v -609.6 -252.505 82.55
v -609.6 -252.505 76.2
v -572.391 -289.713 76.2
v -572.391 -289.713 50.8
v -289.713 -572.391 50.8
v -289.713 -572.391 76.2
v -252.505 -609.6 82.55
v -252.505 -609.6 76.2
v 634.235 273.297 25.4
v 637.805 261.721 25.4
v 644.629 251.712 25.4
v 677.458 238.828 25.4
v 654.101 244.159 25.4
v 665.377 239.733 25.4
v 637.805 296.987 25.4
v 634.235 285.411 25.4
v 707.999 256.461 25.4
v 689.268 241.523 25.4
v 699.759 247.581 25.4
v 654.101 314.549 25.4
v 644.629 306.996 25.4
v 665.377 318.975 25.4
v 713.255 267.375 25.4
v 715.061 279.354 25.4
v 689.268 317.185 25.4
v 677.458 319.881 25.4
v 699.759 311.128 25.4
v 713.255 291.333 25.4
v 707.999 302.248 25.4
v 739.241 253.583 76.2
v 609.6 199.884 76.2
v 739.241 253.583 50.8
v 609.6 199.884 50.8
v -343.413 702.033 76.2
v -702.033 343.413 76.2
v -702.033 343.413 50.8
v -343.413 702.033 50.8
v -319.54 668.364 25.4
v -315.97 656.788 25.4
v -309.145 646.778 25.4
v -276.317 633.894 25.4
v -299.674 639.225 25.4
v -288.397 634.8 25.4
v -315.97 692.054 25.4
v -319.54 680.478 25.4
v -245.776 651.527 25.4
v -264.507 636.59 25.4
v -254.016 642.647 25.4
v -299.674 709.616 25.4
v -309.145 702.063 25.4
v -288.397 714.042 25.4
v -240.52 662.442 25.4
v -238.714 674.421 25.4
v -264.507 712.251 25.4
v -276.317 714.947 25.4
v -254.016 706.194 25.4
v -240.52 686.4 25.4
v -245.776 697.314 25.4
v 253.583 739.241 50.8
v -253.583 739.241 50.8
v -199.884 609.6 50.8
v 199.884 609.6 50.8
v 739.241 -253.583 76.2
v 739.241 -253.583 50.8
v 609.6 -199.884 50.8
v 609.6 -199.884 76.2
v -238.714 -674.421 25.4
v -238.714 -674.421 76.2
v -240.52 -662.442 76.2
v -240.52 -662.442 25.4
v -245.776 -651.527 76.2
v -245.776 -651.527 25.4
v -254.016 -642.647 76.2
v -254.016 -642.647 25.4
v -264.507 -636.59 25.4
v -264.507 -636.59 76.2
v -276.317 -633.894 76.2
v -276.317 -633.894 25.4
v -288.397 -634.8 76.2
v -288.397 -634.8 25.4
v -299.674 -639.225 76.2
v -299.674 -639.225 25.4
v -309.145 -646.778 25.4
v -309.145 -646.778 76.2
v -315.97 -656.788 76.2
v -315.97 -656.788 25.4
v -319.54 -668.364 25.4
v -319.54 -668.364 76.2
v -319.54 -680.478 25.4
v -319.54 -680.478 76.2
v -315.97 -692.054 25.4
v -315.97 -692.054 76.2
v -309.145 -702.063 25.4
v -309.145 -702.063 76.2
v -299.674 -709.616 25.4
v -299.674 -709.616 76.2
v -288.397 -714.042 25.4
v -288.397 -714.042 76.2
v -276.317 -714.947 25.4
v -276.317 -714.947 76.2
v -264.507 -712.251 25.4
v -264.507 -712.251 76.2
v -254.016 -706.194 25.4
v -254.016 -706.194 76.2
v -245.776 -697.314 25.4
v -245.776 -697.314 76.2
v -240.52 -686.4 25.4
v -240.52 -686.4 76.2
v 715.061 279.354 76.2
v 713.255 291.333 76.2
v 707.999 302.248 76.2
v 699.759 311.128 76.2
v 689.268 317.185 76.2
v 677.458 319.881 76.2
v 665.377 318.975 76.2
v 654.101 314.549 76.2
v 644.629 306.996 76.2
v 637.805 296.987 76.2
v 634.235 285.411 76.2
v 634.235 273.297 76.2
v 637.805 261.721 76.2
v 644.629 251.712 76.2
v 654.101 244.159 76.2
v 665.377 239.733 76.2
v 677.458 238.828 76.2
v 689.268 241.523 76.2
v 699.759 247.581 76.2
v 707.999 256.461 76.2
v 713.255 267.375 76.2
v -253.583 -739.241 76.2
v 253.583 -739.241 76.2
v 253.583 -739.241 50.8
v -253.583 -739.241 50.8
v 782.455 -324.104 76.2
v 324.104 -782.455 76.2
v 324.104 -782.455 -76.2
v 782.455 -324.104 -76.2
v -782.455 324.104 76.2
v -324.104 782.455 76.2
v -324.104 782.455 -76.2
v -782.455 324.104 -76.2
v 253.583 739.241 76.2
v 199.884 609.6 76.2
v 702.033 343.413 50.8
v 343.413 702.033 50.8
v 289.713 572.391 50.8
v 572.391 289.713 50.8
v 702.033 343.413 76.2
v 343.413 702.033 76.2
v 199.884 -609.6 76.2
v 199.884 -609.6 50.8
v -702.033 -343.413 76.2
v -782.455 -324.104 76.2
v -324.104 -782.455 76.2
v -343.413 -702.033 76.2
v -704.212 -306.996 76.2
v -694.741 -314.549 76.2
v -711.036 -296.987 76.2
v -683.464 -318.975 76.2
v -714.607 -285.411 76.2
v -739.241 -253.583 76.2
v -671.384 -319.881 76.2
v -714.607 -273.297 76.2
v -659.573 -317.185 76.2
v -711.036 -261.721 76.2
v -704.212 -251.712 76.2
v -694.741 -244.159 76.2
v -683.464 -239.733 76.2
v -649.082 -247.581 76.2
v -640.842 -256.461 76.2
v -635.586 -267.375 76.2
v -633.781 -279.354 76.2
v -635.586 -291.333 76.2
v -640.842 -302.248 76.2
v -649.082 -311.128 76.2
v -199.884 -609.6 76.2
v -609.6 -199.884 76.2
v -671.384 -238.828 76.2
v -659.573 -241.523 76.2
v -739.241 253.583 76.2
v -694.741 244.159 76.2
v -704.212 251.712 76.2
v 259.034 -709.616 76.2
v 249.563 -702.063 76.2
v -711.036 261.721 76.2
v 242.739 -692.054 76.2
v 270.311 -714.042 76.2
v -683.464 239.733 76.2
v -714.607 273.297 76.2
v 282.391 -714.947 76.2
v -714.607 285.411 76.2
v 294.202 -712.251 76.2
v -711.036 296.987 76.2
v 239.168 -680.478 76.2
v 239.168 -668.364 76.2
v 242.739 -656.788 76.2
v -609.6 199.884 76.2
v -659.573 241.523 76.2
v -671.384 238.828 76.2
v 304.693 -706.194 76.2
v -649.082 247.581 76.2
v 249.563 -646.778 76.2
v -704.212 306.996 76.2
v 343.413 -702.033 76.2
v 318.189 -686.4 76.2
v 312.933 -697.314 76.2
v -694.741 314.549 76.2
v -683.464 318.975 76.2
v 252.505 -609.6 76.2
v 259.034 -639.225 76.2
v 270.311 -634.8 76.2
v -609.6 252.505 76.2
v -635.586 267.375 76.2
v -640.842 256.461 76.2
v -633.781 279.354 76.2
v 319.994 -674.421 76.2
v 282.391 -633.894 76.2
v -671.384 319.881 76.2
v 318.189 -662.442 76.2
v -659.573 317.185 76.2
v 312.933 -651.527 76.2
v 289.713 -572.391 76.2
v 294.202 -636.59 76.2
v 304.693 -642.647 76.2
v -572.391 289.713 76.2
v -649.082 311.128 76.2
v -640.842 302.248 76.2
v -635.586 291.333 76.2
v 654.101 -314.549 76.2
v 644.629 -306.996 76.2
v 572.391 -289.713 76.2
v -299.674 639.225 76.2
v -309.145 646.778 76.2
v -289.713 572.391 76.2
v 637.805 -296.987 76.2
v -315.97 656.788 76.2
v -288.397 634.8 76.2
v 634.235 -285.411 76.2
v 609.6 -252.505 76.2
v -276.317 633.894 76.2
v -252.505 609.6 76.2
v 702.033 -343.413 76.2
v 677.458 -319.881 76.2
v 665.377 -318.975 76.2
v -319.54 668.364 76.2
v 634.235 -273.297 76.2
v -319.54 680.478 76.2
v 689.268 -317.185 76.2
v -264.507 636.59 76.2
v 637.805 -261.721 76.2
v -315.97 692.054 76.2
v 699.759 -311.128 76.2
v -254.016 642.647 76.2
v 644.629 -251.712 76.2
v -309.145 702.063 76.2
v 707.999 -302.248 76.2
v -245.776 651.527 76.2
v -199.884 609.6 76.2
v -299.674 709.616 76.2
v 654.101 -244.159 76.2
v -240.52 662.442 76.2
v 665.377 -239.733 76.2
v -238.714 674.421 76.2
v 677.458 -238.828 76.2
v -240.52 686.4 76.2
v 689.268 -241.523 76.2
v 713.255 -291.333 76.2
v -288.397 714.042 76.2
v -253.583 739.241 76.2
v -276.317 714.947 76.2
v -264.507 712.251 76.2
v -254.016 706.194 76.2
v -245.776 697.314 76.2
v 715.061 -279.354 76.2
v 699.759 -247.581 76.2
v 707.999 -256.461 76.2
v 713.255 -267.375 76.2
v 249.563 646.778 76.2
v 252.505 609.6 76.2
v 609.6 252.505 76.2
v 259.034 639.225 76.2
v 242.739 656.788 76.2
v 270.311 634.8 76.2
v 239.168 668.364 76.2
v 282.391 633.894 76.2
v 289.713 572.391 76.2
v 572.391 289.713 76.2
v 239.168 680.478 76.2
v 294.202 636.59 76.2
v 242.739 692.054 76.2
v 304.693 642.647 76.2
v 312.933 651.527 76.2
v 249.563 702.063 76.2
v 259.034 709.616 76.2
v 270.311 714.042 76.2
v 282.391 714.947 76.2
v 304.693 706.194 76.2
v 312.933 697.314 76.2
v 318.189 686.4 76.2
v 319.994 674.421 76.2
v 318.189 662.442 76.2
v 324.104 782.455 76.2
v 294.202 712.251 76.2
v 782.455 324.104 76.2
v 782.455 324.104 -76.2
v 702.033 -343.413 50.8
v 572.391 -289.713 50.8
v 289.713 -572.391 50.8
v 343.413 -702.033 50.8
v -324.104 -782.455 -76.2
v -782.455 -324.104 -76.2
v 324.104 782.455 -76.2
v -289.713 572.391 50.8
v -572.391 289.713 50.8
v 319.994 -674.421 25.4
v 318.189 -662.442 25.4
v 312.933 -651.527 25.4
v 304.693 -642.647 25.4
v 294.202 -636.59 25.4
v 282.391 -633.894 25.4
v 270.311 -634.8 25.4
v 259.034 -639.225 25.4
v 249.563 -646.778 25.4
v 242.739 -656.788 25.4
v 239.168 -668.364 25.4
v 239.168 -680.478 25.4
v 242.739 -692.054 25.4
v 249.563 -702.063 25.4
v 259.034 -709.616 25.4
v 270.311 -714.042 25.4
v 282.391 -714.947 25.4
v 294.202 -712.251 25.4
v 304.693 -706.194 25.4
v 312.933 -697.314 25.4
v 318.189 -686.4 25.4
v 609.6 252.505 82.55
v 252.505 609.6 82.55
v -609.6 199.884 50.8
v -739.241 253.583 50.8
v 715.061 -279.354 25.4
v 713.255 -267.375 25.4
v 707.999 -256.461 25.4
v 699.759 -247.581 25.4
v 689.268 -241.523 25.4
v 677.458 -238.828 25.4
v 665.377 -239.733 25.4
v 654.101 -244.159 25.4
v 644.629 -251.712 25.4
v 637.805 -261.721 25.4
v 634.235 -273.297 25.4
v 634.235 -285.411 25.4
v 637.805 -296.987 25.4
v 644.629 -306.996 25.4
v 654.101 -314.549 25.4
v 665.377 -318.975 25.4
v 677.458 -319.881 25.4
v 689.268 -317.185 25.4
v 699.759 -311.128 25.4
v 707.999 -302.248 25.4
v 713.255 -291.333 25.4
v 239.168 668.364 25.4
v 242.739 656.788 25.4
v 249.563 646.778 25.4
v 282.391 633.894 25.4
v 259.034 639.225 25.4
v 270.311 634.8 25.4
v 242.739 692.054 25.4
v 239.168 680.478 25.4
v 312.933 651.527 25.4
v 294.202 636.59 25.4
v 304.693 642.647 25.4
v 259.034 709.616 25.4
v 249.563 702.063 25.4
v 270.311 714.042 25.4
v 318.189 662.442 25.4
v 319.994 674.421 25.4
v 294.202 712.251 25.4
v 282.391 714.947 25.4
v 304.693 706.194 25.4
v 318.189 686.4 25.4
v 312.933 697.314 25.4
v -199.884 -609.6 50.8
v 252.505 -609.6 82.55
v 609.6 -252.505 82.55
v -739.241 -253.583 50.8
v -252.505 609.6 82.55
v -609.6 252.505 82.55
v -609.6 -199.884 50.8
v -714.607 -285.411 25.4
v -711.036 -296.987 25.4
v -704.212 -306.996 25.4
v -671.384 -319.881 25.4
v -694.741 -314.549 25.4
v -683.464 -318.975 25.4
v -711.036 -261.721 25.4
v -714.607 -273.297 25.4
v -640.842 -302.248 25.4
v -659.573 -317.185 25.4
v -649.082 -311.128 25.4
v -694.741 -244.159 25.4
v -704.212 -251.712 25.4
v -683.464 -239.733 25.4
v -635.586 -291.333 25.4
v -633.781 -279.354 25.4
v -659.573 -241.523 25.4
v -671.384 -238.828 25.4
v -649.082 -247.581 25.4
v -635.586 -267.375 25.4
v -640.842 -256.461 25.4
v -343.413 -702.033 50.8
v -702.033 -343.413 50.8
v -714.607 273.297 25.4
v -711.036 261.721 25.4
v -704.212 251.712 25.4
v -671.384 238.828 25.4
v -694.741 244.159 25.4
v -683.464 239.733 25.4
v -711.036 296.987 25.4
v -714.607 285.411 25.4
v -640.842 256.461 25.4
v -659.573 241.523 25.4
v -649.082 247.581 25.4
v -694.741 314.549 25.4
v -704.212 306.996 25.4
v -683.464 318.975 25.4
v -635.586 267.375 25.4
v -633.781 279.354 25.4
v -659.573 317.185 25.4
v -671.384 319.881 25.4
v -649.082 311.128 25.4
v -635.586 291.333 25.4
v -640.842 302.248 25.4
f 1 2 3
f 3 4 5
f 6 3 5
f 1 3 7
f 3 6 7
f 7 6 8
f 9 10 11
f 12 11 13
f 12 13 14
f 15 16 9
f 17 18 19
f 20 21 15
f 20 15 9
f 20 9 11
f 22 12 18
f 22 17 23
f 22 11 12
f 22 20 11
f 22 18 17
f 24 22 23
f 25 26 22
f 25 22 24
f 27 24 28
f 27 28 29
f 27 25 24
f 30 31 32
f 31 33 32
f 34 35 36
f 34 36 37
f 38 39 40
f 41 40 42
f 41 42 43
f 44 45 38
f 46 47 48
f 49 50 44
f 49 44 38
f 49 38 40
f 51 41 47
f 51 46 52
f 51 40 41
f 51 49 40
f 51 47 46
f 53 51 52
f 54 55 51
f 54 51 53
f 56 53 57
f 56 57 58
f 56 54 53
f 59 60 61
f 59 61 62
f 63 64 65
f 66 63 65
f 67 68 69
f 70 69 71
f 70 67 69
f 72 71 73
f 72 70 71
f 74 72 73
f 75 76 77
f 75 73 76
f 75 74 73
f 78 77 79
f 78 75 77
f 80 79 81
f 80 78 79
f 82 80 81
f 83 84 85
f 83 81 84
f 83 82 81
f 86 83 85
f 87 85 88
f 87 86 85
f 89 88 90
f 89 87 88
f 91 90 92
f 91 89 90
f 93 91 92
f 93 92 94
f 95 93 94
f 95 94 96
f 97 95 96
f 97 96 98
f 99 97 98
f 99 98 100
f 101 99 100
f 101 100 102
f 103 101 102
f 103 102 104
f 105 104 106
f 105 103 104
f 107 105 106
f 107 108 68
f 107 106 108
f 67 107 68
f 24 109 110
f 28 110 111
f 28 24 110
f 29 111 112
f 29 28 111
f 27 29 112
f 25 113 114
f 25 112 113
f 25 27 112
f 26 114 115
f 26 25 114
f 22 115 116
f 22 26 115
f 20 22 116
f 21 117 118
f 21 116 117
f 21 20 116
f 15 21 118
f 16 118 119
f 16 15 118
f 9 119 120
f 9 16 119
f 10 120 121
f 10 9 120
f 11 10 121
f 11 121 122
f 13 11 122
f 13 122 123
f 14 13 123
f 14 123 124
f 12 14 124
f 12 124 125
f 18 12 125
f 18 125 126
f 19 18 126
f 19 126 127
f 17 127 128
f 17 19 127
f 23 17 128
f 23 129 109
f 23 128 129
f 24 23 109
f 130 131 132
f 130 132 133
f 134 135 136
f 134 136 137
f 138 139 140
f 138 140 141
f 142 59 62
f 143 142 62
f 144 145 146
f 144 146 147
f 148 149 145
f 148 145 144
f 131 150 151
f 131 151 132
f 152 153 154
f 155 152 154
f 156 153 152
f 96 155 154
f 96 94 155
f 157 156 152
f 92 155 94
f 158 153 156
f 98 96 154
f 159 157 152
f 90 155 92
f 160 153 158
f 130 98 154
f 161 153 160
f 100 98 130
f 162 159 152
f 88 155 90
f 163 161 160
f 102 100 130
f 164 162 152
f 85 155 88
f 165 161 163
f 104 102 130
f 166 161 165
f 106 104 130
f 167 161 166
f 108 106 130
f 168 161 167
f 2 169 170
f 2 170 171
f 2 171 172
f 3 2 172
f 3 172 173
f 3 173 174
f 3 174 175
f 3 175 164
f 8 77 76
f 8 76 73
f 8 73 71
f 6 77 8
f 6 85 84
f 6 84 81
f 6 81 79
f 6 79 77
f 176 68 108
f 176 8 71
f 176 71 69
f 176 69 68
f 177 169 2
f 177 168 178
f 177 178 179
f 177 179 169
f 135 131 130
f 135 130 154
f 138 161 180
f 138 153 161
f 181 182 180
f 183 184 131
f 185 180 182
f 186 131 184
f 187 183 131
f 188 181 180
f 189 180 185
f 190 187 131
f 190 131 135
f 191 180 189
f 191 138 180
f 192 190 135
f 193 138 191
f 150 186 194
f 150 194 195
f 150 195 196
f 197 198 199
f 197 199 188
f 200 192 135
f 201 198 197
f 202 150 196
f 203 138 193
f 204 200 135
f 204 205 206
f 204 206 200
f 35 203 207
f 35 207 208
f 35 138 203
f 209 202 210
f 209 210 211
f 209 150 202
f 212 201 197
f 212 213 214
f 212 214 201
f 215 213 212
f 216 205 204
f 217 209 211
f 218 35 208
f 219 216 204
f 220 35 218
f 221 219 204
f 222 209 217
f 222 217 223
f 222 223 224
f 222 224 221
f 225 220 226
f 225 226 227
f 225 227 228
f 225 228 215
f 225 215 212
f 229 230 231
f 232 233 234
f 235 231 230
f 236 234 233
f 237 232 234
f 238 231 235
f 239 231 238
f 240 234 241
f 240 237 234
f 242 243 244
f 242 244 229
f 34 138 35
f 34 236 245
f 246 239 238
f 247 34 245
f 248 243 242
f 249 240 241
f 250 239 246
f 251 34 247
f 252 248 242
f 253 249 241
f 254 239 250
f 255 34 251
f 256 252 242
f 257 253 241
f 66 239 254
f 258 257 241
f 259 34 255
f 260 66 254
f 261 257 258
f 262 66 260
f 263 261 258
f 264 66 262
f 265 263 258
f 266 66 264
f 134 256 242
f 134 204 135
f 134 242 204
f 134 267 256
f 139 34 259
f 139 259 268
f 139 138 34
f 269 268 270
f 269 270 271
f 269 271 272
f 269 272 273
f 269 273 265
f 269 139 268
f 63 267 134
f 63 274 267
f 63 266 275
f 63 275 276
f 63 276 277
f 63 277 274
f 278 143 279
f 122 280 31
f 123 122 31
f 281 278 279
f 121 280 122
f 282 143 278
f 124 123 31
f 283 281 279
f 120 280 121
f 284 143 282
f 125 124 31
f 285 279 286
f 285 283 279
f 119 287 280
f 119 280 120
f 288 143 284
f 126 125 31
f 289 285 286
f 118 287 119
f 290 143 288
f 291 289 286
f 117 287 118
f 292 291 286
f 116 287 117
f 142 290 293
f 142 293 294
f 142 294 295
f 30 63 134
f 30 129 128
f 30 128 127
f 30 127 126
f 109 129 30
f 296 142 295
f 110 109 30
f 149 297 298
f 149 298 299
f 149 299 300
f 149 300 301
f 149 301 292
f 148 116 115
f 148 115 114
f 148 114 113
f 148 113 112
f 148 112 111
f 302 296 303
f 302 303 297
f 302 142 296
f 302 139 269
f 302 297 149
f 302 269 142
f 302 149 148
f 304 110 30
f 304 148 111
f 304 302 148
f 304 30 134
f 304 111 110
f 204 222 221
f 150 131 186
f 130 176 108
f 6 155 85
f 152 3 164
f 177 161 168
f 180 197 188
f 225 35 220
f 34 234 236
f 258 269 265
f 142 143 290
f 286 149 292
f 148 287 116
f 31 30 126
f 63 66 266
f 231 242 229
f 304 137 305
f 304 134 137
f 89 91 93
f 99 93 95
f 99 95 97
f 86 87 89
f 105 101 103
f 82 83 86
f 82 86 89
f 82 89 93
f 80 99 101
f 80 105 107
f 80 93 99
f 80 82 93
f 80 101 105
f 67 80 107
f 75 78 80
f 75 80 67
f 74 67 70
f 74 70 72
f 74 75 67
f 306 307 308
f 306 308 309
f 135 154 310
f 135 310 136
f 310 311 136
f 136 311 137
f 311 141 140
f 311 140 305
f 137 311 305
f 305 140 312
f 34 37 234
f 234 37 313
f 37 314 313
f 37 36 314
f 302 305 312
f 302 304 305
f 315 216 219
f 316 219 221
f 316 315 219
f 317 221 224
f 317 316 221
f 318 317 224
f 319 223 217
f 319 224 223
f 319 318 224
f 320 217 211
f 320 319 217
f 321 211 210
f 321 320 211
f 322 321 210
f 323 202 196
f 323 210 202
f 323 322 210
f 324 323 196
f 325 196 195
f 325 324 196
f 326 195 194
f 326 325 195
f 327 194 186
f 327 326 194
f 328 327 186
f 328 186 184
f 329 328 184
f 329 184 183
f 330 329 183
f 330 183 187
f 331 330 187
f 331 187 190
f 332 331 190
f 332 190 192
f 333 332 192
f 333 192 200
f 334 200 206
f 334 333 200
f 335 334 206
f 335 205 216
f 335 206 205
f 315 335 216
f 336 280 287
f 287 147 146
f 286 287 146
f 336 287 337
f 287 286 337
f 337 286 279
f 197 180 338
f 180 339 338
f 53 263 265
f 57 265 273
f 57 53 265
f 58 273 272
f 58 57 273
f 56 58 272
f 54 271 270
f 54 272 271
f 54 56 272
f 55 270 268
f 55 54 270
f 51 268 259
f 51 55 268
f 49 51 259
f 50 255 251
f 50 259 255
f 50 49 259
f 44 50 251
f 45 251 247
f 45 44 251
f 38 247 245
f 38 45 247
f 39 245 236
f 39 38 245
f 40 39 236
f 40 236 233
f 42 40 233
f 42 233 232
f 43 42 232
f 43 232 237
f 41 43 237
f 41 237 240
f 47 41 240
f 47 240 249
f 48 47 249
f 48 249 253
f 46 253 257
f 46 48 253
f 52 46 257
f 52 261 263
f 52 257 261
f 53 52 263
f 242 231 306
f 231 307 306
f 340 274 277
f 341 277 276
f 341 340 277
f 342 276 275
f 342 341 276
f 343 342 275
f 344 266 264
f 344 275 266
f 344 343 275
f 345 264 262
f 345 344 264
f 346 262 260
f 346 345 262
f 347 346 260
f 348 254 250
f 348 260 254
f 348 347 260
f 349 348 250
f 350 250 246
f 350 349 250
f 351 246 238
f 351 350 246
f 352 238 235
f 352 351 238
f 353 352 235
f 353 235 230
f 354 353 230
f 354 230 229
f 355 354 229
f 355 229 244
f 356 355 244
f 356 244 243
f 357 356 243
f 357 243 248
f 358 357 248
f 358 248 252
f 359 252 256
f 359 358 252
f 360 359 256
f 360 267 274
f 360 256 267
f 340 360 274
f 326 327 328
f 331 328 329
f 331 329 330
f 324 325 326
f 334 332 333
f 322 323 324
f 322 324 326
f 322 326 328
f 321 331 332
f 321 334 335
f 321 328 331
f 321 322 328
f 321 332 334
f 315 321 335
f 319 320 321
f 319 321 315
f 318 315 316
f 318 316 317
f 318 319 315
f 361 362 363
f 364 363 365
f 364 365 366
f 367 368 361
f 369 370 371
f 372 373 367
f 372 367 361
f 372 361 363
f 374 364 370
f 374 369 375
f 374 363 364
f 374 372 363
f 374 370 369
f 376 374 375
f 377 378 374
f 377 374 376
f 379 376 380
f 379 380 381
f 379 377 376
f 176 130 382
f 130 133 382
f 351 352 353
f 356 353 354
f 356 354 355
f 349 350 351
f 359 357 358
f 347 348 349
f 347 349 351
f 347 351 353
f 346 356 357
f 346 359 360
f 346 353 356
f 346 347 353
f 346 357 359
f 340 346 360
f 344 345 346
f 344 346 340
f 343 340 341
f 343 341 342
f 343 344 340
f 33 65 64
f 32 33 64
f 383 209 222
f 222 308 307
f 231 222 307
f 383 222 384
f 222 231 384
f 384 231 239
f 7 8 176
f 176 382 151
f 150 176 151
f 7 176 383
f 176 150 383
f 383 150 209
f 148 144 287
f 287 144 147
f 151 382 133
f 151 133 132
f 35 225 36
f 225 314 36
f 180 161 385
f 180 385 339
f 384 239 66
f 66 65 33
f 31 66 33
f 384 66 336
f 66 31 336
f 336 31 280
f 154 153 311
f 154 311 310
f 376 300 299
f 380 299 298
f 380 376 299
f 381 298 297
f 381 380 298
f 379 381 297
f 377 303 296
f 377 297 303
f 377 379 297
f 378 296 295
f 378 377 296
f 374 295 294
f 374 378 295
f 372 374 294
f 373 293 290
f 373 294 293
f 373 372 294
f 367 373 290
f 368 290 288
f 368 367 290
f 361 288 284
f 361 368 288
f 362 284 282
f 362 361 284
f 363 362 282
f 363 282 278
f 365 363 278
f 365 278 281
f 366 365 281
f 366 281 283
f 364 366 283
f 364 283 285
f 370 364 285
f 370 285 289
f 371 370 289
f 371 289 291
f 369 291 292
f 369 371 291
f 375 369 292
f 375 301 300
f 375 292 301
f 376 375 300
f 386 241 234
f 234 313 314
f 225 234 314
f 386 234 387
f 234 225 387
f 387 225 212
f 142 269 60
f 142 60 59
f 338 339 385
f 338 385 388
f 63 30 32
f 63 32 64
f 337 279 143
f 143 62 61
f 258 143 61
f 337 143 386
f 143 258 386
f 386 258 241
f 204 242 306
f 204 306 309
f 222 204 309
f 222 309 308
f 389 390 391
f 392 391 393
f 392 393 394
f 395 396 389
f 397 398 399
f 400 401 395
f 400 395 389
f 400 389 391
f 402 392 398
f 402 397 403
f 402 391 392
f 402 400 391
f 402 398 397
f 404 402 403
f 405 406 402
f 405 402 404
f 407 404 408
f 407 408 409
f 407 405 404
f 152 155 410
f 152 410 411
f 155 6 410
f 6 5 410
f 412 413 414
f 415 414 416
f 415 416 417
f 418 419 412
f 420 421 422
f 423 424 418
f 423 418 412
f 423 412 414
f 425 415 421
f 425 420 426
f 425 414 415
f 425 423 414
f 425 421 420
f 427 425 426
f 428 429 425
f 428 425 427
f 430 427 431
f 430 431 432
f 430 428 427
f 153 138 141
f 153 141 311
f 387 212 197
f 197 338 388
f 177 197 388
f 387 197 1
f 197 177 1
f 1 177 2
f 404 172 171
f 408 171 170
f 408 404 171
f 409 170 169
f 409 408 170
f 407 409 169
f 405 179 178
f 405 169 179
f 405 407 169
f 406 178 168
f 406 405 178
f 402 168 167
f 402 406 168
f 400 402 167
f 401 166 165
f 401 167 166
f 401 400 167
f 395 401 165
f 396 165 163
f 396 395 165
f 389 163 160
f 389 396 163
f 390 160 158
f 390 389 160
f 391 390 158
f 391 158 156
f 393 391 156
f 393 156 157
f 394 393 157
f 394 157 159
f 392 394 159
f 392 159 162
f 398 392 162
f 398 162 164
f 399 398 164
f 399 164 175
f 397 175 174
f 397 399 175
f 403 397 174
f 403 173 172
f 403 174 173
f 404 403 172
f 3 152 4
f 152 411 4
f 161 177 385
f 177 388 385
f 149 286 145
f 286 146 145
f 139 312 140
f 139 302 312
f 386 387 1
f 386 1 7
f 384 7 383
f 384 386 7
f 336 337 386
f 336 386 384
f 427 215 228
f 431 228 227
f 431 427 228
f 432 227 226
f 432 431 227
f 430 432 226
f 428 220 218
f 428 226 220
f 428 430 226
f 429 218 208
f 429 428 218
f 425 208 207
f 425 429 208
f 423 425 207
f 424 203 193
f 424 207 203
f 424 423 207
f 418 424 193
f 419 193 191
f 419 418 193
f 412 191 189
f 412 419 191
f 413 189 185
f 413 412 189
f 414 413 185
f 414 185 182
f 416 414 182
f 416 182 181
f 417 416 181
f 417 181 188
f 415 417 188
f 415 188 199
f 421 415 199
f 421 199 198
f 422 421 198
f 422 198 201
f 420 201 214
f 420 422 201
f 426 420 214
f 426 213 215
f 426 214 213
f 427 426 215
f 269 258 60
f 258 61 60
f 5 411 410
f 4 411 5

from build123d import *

# Parameters (mm, degrees)
F1_DEPTH = 76.2
F2_DEPTH = 63.5
F3_DEPTH = 12.7
F0_R     = 40.64
F4_DEPTH = 76.2
F5_DEPTH = 76.201
F6_DEPTH = 25.4
F7_DEPTH = 76.2
F8_DEPTH = 82.55
F9_DEPTH = 12.7


with BuildPart() as f1:
    # F0 (on Top) → F1 (new body, symmetric)
    with BuildSketch(Plane.XY):
        Polygon((324.1035716087, 782.4552381913), (-324.1035716087, 782.4552381913), (-782.4552381913, 324.1035716087), (-782.4552381913, -324.1035716087), (-324.1035716087, -782.4552381913), (324.1035716087, -782.4552381913), (782.4552381913, -324.1035716087), (782.4552381913, 324.1035716087), align=None)
        Polygon((-306.2038256122, 739.2414286435), (-253.5827489128, 739.2414286435), (253.5827489128, 739.2414286435), (306.2038256122, 739.2414286435), (343.4125457797, 702.032708476), (702.032708476, 343.4125457797), (739.2414286435, 306.2038256122), (739.2414286435, 253.5827489128), (739.2414286435, -253.5827489128), (739.2414286435, -306.2038256122), (702.032708476, -343.4125457797), (343.4125457797, -702.032708476), (306.2038256122, -739.2414286435), (253.5827489128, -739.2414286435), (-253.5827489128, -739.2414286435), (-306.2038256122, -739.2414286435), (-343.4125457797, -702.032708476), (-702.032708476, -343.4125457797), (-739.2414286435, -306.2038256122), (-739.2414286435, -253.5827489128), (-739.2414286435, 253.5827489128), (-739.2414286435, 306.2038256122), (-702.032708476, 343.4125457797), (-343.4125457797, 702.032708476), align=None, mode=Mode.SUBTRACT)
    extrude(amount=F1_DEPTH, both=True)

    # F0 (on Top) → F2 (join, symmetric)
    with BuildSketch(Plane.XY):
        Polygon((-572.3912798325, 289.7133077901), (-289.7133077901, 572.3912798325), (-343.4125457797, 702.032708476), (-702.032708476, 343.4125457797), align=None)
        Polygon((-253.5827489128, 739.2414286435), (-199.8835109232, 609.6), (199.8835109232, 609.6), (253.5827489128, 739.2414286435), align=None)
        Polygon((343.4125457797, 702.032708476), (289.7133077901, 572.3912798325), (572.3912798325, 289.7133077901), (702.032708476, 343.4125457797), align=None)
        Polygon((-609.6, -199.8835109232), (-609.6, 199.8835109232), (-739.2414286435, 253.5827489128), (-739.2414286435, -253.5827489128), align=None)
        Polygon((739.2414286435, 253.5827489128), (609.6, 199.8835109232), (609.6, -199.8835109232), (739.2414286435, -253.5827489128), align=None)
        Polygon((702.032708476, -343.4125457797), (572.3912798325, -289.7133077901), (289.7133077901, -572.3912798325), (343.4125457797, -702.032708476), align=None)
        Polygon((199.8835109232, -609.6), (-199.8835109232, -609.6), (-253.5827489128, -739.2414286435), (253.5827489128, -739.2414286435), align=None)
        Polygon((-289.7133077901, -572.3912798325), (-572.3912798325, -289.7133077901), (-702.032708476, -343.4125457797), (-343.4125457797, -702.032708476), align=None)
    extrude(amount=F2_DEPTH, both=True)

    # F3 (add): faces of the model
    f3_faces = [f1.faces().sort_by_distance(p)[0] for p in [
        (478.6967193132, -478.6967193132, -63.5),
        (0, -676.9793927162, -63.5),
        (-478.6967193132, -478.6967193132, -63.5),
        (-676.9793927162, 0, -63.5),
        (-478.6967193132, 478.6967193132, -63.5),
        (0, 676.9793927162, -63.5),
        (478.6967193132, 478.6967193132, -63.5),
        (676.9793927162, 0, -63.5),
    ]]
    extrude(f3_faces, amount=F3_DEPTH)

    # F0 (on Top) → F4 (join, symmetric)
    with BuildSketch(Plane.XY):
        Polygon((-289.7133077901, 572.3912798325), (-252.5045876226, 609.6), (-199.8835109232, 609.6), (-253.5827489128, 739.2414286435), (-306.2038256122, 739.2414286435), (-343.4125457797, 702.032708476), align=None)
        with Locations((-279.3542066174, 674.4207143217)):
            Circle(F0_R, mode=Mode.SUBTRACT)
        Polygon((253.5827489128, 739.2414286435), (199.8835109232, 609.6), (252.5045876226, 609.6), (289.7133077901, 572.3912798325), (343.4125457797, 702.032708476), (306.2038256122, 739.2414286435), align=None)
        with Locations((279.3542066174, 674.4207143217)):
            Circle(F0_R, mode=Mode.SUBTRACT)
        Polygon((-609.6, 252.5045876226), (-572.3912798325, 289.7133077901), (-702.032708476, 343.4125457797), (-739.2414286435, 306.2038256122), (-739.2414286435, 253.5827489128), (-609.6, 199.8835109232), align=None)
        with Locations((-674.4207143217, 279.3542066174)):
            Circle(F0_R, mode=Mode.SUBTRACT)
        Polygon((-609.6, -252.5045876226), (-609.6, -199.8835109232), (-739.2414286435, -253.5827489128), (-739.2414286435, -306.2038256122), (-702.032708476, -343.4125457797), (-572.3912798325, -289.7133077901), align=None)
        with Locations((-674.4207143217, -279.3542066174)):
            Circle(F0_R, mode=Mode.SUBTRACT)
        Polygon((702.032708476, 343.4125457797), (572.3912798325, 289.7133077901), (609.6, 252.5045876226), (609.6, 199.8835109232), (739.2414286435, 253.5827489128), (739.2414286435, 306.2038256122), align=None)
        with Locations((674.4207143217, 279.3542066174)):
            Circle(F0_R, mode=Mode.SUBTRACT)
        Polygon((739.2414286435, -253.5827489128), (609.6, -199.8835109232), (609.6, -252.5045876226), (572.3912798325, -289.7133077901), (702.032708476, -343.4125457797), (739.2414286435, -306.2038256122), align=None)
        with Locations((674.4207143217, -279.3542066174)):
            Circle(F0_R, mode=Mode.SUBTRACT)
        Polygon((-252.5045876226, -609.6), (-289.7133077901, -572.3912798325), (-343.4125457797, -702.032708476), (-306.2038256122, -739.2414286435), (-253.5827489128, -739.2414286435), (-199.8835109232, -609.6), align=None)
        with Locations((-279.3542066174, -674.4207143217)):
            Circle(F0_R, mode=Mode.SUBTRACT)
        Polygon((343.4125457797, -702.032708476), (289.7133077901, -572.3912798325), (252.5045876226, -609.6), (199.8835109232, -609.6), (253.5827489128, -739.2414286435), (306.2038256122, -739.2414286435), align=None)
        with Locations((279.3542066174, -674.4207143217)):
            Circle(F0_R, mode=Mode.SUBTRACT)
        with Locations((674.4207143217, 279.3542066174)):
            Circle(F0_R)
        with Locations((279.3542066174, 674.4207143217)):
            Circle(F0_R)
        with Locations((-279.3542066174, 674.4207143217)):
            Circle(F0_R)
        with Locations((-674.4207143217, 279.3542066174)):
            Circle(F0_R)
        with Locations((-674.4207143217, -279.3542066174)):
            Circle(F0_R)
        with Locations((-279.3542066174, -674.4207143217)):
            Circle(F0_R)
        with Locations((279.3542066174, -674.4207143217)):
            Circle(F0_R)
        with Locations((674.4207143217, -279.3542066174)):
            Circle(F0_R)
    extrude(amount=F4_DEPTH, both=True)

    # F0 (on Top) → F5 (cut, through all)
    with BuildSketch(Plane.XY):
        with Locations((-674.4207143217, 279.3542066174)):
            Circle(F0_R)
        with Locations((-279.3542066174, 674.4207143217)):
            Circle(F0_R)
        with Locations((279.3542066174, 674.4207143217)):
            Circle(F0_R)
        with Locations((674.4207143217, 279.3542066174)):
            Circle(F0_R)
        with Locations((674.4207143217, -279.3542066174)):
            Circle(F0_R)
        with Locations((279.3542066174, -674.4207143217)):
            Circle(F0_R)
        with Locations((-279.3542066174, -674.4207143217)):
            Circle(F0_R)
        with Locations((-674.4207143217, -279.3542066174)):
            Circle(F0_R)
    extrude(amount=F5_DEPTH, mode=Mode.SUBTRACT)

    # F0 (on Top) → F6 (join)
    with BuildSketch(Plane.XY):
        with Locations((-279.3542066174, 674.4207143217)):
            Circle(F0_R)
        with Locations((279.3542066174, 674.4207143217)):
            Circle(F0_R)
        with Locations((674.4207143217, 279.3542066174)):
            Circle(F0_R)
        with Locations((674.4207143217, -279.3542066174)):
            Circle(F0_R)
        with Locations((279.3542066174, -674.4207143217)):
            Circle(F0_R)
        with Locations((-279.3542066174, -674.4207143217)):
            Circle(F0_R)
        with Locations((-674.4207143217, -279.3542066174)):
            Circle(F0_R)
        with Locations((-674.4207143217, 279.3542066174)):
            Circle(F0_R)
    extrude(amount=F6_DEPTH)

    # F0 (on Top) → F7 (join)
    with BuildSketch(Plane.XY):
        Polygon((-199.8835109232, 609.6), (-252.5045876226, 609.6), (-289.7133077901, 572.3912798325), (-572.3912798325, 289.7133077901), (-609.6, 252.5045876226), (-609.6, 199.8835109232), (-609.6, -199.8835109232), (-609.6, -252.5045876226), (-572.3912798325, -289.7133077901), (-289.7133077901, -572.3912798325), (-252.5045876226, -609.6), (-199.8835109232, -609.6), (199.8835109232, -609.6), (252.5045876226, -609.6), (289.7133077901, -572.3912798325), (572.3912798325, -289.7133077901), (609.6, -252.5045876226), (609.6, -199.8835109232), (609.6, 199.8835109232), (609.6, 252.5045876226), (572.3912798325, 289.7133077901), (289.7133077901, 572.3912798325), (252.5045876226, 609.6), (199.8835109232, 609.6), align=None)
    extrude(amount=-F7_DEPTH)

    # F0 (on Top) → F8 (join)
    with BuildSketch(Plane.XY):
        Polygon((-199.8835109232, 609.6), (-252.5045876226, 609.6), (-289.7133077901, 572.3912798325), (-572.3912798325, 289.7133077901), (-609.6, 252.5045876226), (-609.6, 199.8835109232), (-609.6, -199.8835109232), (-609.6, -252.5045876226), (-572.3912798325, -289.7133077901), (-289.7133077901, -572.3912798325), (-252.5045876226, -609.6), (-199.8835109232, -609.6), (199.8835109232, -609.6), (252.5045876226, -609.6), (289.7133077901, -572.3912798325), (572.3912798325, -289.7133077901), (609.6, -252.5045876226), (609.6, -199.8835109232), (609.6, 199.8835109232), (609.6, 252.5045876226), (572.3912798325, 289.7133077901), (289.7133077901, 572.3912798325), (252.5045876226, 609.6), (199.8835109232, 609.6), align=None)
    extrude(amount=F8_DEPTH)

    # F9 (cut): faces of the model
    f9_faces = [f1.faces().sort_by_distance(p)[0] for p in [
        (0, -676.9793927162, 63.5),
        (478.6967193132, -478.6967193132, 63.5),
        (676.9793927162, 0, 63.5),
        (478.6967193132, 478.6967193132, 63.5),
        (0, 676.9793927162, 63.5),
        (-478.6967193132, 478.6967193132, 63.5),
        (-676.9793927162, 0, 63.5),
        (-478.6967193132, -478.6967193132, 63.5),
    ]]
    extrude(f9_faces, amount=-F9_DEPTH, mode=Mode.SUBTRACT)


solid = f1.part
